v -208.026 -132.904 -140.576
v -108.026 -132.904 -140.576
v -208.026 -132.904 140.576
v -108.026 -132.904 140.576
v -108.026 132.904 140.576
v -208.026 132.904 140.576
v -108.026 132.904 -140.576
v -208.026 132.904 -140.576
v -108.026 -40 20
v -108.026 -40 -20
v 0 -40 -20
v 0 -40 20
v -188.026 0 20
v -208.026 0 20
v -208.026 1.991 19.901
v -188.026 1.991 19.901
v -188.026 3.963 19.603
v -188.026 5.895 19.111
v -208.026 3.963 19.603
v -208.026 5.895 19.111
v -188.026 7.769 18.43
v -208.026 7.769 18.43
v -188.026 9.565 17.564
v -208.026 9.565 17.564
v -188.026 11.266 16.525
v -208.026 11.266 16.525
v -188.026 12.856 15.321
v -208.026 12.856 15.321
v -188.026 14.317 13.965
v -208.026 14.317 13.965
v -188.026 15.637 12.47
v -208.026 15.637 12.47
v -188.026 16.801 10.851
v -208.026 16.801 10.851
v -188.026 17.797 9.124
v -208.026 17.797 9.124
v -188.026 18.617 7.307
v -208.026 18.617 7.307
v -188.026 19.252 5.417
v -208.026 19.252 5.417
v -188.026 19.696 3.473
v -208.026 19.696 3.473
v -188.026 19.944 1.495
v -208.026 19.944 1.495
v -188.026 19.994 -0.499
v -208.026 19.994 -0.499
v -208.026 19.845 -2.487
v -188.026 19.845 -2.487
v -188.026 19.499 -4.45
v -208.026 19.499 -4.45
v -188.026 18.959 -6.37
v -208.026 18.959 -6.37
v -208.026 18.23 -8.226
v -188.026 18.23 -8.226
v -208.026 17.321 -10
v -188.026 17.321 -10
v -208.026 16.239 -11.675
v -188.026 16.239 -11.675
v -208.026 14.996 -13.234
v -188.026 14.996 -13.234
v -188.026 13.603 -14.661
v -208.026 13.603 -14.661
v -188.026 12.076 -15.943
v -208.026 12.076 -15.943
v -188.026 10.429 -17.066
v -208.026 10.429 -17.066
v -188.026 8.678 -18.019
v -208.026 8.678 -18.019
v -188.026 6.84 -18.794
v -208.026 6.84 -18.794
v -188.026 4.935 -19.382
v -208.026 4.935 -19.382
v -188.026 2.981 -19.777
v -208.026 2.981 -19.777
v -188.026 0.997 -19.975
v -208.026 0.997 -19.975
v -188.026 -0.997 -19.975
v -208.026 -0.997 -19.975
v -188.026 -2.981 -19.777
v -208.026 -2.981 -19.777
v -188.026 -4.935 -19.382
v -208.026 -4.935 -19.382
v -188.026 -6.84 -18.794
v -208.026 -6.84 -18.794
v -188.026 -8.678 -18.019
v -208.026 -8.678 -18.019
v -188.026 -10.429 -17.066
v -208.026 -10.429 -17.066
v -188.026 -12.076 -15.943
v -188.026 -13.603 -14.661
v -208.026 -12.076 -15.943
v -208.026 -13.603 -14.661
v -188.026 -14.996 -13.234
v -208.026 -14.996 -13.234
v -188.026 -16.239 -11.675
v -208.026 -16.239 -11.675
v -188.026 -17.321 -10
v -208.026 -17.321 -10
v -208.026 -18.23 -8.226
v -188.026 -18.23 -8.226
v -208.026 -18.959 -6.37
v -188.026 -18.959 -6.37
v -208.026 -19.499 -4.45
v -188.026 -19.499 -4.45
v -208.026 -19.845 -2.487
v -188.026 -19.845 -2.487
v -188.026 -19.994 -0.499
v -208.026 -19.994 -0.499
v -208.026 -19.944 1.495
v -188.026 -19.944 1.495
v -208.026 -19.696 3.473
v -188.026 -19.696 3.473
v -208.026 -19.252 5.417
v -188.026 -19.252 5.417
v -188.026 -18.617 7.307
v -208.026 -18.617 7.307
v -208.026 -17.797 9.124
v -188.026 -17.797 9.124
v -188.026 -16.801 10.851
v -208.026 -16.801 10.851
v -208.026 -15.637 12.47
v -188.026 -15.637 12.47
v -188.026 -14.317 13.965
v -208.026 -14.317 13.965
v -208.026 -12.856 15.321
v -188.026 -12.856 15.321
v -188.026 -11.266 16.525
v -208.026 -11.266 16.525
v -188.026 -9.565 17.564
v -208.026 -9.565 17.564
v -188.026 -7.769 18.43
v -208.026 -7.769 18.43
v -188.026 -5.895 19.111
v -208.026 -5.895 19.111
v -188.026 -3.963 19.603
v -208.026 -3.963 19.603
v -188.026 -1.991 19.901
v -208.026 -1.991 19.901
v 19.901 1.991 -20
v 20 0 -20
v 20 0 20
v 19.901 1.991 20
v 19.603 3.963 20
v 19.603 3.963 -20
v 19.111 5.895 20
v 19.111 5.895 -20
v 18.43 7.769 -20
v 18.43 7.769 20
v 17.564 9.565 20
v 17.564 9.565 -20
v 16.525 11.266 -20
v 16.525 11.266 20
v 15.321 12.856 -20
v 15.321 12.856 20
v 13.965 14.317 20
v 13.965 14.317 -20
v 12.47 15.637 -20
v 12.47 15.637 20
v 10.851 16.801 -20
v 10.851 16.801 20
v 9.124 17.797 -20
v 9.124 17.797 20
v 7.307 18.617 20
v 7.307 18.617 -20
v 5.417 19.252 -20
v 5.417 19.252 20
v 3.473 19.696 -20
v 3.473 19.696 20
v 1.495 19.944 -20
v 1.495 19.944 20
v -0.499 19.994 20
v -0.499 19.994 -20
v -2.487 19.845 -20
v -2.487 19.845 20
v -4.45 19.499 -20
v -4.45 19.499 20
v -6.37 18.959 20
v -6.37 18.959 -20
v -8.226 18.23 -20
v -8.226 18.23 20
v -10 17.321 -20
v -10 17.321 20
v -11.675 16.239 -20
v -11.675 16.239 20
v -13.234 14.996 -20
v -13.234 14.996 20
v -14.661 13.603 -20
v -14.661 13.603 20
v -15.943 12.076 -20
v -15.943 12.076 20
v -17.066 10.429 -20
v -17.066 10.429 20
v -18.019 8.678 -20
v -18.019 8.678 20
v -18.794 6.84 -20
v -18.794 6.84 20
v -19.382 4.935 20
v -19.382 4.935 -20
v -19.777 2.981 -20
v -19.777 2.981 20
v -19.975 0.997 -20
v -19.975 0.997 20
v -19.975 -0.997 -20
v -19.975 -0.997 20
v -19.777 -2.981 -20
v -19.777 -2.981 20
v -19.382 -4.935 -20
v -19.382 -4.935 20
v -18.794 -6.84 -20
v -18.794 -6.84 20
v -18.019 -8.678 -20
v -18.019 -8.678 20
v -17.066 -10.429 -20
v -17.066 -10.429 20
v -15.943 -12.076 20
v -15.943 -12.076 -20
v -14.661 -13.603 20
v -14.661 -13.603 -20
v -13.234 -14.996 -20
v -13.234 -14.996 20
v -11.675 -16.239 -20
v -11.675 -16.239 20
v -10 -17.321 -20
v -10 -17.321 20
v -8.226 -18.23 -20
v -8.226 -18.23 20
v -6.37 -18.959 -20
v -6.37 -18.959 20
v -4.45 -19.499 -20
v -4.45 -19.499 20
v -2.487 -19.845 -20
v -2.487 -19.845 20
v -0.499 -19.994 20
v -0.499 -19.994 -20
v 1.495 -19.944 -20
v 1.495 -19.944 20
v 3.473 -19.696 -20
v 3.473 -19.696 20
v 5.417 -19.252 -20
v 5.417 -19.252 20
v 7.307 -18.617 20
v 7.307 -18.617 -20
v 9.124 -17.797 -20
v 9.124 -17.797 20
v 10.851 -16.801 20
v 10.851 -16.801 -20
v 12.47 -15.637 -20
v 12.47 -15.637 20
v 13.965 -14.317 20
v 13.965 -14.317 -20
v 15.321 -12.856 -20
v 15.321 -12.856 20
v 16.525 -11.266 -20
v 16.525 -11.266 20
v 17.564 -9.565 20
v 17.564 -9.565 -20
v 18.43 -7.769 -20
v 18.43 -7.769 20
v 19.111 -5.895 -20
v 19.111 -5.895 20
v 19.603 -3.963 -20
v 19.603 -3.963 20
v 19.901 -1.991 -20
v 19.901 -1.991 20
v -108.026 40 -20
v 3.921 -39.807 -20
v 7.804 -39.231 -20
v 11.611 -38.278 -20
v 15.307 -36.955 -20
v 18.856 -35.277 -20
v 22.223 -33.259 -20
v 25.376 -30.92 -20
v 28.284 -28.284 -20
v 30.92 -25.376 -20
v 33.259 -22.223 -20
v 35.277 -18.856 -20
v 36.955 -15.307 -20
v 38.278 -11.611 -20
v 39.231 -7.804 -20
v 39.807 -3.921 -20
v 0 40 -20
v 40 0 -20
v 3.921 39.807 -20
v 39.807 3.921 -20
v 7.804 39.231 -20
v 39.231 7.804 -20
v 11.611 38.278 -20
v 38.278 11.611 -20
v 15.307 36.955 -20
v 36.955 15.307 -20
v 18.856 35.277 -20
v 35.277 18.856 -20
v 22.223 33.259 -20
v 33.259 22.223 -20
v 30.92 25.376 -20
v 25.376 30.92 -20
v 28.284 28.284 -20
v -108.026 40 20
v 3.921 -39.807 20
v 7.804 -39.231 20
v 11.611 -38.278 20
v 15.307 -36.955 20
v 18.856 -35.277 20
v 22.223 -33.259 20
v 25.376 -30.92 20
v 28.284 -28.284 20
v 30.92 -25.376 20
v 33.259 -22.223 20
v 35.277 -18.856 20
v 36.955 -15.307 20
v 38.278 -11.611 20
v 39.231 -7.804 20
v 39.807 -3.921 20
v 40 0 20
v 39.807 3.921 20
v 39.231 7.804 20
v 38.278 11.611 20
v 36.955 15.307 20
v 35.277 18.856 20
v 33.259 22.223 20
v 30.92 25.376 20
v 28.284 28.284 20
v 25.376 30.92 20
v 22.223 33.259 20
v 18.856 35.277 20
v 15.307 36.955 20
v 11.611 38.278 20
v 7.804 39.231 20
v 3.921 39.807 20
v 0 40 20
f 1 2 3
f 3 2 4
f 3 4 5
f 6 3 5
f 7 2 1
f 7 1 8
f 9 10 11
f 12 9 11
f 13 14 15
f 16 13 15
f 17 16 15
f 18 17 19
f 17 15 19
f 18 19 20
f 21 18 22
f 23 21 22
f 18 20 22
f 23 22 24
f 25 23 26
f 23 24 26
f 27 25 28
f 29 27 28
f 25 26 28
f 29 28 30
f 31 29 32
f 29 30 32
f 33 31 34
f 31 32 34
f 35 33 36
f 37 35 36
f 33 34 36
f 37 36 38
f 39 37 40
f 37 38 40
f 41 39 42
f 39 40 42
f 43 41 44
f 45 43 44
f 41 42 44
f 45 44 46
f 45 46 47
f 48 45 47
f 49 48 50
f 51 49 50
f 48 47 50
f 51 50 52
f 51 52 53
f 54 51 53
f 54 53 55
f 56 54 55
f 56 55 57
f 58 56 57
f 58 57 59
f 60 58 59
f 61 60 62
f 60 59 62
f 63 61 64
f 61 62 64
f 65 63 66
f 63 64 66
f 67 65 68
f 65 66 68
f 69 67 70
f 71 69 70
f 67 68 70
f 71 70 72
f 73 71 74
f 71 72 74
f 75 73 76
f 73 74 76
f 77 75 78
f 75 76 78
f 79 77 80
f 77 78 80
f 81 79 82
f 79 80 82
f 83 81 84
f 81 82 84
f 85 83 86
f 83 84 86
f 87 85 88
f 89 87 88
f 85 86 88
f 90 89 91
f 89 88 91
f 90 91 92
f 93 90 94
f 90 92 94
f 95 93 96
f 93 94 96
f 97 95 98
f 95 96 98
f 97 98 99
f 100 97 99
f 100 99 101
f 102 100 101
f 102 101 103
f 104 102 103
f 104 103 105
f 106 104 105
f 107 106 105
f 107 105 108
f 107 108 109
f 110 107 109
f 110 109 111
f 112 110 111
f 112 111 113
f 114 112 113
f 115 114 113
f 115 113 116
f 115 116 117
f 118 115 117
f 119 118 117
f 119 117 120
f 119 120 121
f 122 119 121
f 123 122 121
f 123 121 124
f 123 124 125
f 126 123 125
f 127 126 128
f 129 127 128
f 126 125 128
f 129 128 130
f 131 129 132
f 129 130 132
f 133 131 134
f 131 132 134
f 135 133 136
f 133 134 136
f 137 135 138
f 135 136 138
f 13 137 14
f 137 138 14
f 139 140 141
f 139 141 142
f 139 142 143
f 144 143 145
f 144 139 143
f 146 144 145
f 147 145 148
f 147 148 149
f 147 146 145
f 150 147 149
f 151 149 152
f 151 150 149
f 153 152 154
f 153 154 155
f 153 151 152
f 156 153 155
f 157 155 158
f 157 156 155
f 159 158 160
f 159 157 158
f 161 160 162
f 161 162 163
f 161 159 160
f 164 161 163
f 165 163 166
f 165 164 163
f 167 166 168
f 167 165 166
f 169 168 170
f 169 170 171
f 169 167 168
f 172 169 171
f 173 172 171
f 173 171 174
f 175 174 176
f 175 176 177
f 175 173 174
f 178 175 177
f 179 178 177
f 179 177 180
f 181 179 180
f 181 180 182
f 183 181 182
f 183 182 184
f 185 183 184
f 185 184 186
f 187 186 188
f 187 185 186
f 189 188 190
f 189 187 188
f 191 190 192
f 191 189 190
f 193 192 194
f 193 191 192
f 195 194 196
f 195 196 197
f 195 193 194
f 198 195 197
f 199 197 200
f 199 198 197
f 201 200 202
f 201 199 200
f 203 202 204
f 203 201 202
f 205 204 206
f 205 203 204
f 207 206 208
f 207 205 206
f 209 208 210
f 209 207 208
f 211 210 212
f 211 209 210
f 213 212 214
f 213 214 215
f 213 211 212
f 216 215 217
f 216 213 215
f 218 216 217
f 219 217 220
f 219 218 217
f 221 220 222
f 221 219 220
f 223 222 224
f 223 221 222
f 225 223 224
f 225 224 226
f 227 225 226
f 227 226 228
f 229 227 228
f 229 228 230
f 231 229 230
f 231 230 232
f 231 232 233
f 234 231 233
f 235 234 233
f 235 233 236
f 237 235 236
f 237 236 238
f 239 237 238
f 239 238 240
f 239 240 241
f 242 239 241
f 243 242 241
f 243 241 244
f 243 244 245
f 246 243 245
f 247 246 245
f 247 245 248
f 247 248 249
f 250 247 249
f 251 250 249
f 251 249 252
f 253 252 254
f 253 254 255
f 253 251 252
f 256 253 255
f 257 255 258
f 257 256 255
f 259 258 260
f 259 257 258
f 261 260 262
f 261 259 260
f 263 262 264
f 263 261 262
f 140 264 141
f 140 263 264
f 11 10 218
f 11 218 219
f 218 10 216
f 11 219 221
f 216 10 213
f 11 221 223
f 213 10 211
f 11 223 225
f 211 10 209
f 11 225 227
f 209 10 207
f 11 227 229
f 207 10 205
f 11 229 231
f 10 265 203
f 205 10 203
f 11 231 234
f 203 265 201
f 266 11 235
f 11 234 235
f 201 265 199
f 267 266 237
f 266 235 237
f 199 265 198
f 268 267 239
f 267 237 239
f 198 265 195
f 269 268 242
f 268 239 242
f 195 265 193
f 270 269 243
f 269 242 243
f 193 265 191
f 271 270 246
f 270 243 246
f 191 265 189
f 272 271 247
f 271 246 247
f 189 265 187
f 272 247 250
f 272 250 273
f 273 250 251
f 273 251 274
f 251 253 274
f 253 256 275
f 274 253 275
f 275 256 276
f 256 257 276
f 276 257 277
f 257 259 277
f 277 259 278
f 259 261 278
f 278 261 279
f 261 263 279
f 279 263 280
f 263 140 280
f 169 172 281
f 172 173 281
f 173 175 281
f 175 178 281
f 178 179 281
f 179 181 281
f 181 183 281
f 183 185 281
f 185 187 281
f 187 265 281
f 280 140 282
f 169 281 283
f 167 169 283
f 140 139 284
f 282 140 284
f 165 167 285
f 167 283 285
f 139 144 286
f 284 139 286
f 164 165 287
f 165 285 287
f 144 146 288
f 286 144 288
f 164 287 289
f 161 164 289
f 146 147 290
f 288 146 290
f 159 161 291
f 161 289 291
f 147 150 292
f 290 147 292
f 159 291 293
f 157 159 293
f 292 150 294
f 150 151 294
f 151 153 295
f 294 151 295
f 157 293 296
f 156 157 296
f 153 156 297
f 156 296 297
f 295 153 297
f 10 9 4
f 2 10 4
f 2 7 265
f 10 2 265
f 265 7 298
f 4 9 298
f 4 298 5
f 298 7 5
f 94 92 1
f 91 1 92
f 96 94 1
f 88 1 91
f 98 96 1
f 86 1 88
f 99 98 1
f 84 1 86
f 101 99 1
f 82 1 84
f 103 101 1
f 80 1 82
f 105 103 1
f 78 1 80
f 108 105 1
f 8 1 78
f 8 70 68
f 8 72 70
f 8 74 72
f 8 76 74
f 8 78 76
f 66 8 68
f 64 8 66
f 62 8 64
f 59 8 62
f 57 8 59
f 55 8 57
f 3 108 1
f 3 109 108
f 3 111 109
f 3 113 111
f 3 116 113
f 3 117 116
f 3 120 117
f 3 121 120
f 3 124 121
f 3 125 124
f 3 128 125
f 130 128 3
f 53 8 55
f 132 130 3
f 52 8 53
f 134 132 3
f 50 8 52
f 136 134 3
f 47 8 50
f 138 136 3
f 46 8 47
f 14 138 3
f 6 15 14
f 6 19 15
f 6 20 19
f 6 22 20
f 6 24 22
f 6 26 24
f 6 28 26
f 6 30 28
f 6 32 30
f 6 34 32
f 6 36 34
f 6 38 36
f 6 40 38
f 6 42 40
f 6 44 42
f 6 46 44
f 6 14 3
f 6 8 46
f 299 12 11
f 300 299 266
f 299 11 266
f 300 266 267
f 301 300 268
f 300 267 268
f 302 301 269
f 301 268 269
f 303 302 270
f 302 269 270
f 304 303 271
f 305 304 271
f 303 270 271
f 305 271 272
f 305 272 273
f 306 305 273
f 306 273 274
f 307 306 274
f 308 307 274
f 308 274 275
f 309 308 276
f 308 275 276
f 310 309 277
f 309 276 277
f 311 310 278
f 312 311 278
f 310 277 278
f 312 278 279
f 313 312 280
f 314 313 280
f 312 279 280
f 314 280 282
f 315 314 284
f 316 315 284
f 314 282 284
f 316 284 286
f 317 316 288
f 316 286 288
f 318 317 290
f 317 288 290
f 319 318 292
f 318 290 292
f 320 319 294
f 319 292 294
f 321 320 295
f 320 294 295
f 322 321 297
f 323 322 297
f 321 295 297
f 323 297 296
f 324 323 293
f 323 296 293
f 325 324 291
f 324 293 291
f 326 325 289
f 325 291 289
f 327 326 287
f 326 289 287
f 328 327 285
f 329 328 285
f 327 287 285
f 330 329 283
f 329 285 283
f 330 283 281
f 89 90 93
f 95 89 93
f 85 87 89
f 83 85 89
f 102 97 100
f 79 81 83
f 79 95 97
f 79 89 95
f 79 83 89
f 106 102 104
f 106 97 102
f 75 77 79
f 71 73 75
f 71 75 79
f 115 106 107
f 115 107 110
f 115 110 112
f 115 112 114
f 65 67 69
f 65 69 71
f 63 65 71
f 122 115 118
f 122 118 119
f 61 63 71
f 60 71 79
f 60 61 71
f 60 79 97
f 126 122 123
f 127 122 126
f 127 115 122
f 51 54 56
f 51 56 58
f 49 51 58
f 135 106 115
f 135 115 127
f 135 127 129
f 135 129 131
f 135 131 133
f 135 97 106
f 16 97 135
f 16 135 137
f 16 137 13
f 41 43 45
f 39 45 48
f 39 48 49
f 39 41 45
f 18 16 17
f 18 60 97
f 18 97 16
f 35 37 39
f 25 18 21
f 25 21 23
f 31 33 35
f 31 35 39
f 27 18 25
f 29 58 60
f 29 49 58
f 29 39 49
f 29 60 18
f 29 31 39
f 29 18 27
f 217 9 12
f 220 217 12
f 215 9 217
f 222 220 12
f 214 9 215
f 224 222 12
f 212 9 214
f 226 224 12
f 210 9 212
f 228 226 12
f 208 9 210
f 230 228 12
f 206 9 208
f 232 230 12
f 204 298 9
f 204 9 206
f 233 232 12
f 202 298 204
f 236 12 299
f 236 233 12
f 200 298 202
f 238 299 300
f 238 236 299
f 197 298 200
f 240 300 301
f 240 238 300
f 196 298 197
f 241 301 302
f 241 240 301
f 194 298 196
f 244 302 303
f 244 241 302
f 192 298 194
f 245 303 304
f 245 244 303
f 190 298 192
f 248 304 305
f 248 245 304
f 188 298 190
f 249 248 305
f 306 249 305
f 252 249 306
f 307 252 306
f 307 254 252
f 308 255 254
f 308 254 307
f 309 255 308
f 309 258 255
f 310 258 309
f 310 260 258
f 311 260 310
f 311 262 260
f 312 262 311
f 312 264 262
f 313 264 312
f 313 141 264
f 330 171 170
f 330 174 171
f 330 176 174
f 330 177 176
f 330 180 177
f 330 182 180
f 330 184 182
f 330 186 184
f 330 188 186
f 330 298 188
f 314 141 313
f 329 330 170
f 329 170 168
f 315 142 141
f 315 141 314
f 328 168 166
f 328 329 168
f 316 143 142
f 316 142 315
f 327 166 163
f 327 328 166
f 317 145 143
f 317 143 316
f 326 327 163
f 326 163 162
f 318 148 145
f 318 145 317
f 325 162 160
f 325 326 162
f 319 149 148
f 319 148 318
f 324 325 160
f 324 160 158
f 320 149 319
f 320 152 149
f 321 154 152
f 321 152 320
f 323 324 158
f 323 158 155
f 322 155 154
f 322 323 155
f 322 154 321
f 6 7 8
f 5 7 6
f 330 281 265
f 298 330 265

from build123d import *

# Parameters (mm, degrees)
EXTRUDE_1_DEPTH      = 20
EXTRUDE_1_DEPTH_BACK = 20
SKETCH_1_R           = 20
SKETCH_2_W           = 281.151719904
SKETCH_2_H           = 265.807540378
EXTRUDE_2_DEPTH      = 100
SKETCH_3_R           = 20
CUT_EXTRUDE_1_DEPTH  = 20


with BuildPart() as part:
    # 草图1 → 凸台-拉伸1 (new, two sides: drawn at the far end of the back side and taken through both)
    with BuildSketch(Plane.XY.offset(-EXTRUDE_1_DEPTH_BACK)):
        with BuildLine():
            Line((0, 40), (-108.026251169, 40))
            Line((-108.026251169, 40), (-108.026251169, -40))
            Line((-108.026251169, -40), (0, -40))
            ThreePointArc((0, -40), (40, 0), (0, 40))
        make_face()
        Circle(SKETCH_1_R, mode=Mode.SUBTRACT)
    extrude(amount=EXTRUDE_1_DEPTH + EXTRUDE_1_DEPTH_BACK)

    # 草图2 → 凸台-拉伸2 (add)
    with BuildSketch(Plane.ZY.offset(108.026251169)):
        Rectangle(SKETCH_2_W, SKETCH_2_H)
    extrude(amount=EXTRUDE_2_DEPTH)

    # 草图3 → 切除-拉伸1 (cut)
    with BuildSketch(Plane.ZY.offset(208.026251169)):
        Circle(SKETCH_3_R)
    extrude(amount=-CUT_EXTRUDE_1_DEPTH, mode=Mode.SUBTRACT)


solid = part.part
